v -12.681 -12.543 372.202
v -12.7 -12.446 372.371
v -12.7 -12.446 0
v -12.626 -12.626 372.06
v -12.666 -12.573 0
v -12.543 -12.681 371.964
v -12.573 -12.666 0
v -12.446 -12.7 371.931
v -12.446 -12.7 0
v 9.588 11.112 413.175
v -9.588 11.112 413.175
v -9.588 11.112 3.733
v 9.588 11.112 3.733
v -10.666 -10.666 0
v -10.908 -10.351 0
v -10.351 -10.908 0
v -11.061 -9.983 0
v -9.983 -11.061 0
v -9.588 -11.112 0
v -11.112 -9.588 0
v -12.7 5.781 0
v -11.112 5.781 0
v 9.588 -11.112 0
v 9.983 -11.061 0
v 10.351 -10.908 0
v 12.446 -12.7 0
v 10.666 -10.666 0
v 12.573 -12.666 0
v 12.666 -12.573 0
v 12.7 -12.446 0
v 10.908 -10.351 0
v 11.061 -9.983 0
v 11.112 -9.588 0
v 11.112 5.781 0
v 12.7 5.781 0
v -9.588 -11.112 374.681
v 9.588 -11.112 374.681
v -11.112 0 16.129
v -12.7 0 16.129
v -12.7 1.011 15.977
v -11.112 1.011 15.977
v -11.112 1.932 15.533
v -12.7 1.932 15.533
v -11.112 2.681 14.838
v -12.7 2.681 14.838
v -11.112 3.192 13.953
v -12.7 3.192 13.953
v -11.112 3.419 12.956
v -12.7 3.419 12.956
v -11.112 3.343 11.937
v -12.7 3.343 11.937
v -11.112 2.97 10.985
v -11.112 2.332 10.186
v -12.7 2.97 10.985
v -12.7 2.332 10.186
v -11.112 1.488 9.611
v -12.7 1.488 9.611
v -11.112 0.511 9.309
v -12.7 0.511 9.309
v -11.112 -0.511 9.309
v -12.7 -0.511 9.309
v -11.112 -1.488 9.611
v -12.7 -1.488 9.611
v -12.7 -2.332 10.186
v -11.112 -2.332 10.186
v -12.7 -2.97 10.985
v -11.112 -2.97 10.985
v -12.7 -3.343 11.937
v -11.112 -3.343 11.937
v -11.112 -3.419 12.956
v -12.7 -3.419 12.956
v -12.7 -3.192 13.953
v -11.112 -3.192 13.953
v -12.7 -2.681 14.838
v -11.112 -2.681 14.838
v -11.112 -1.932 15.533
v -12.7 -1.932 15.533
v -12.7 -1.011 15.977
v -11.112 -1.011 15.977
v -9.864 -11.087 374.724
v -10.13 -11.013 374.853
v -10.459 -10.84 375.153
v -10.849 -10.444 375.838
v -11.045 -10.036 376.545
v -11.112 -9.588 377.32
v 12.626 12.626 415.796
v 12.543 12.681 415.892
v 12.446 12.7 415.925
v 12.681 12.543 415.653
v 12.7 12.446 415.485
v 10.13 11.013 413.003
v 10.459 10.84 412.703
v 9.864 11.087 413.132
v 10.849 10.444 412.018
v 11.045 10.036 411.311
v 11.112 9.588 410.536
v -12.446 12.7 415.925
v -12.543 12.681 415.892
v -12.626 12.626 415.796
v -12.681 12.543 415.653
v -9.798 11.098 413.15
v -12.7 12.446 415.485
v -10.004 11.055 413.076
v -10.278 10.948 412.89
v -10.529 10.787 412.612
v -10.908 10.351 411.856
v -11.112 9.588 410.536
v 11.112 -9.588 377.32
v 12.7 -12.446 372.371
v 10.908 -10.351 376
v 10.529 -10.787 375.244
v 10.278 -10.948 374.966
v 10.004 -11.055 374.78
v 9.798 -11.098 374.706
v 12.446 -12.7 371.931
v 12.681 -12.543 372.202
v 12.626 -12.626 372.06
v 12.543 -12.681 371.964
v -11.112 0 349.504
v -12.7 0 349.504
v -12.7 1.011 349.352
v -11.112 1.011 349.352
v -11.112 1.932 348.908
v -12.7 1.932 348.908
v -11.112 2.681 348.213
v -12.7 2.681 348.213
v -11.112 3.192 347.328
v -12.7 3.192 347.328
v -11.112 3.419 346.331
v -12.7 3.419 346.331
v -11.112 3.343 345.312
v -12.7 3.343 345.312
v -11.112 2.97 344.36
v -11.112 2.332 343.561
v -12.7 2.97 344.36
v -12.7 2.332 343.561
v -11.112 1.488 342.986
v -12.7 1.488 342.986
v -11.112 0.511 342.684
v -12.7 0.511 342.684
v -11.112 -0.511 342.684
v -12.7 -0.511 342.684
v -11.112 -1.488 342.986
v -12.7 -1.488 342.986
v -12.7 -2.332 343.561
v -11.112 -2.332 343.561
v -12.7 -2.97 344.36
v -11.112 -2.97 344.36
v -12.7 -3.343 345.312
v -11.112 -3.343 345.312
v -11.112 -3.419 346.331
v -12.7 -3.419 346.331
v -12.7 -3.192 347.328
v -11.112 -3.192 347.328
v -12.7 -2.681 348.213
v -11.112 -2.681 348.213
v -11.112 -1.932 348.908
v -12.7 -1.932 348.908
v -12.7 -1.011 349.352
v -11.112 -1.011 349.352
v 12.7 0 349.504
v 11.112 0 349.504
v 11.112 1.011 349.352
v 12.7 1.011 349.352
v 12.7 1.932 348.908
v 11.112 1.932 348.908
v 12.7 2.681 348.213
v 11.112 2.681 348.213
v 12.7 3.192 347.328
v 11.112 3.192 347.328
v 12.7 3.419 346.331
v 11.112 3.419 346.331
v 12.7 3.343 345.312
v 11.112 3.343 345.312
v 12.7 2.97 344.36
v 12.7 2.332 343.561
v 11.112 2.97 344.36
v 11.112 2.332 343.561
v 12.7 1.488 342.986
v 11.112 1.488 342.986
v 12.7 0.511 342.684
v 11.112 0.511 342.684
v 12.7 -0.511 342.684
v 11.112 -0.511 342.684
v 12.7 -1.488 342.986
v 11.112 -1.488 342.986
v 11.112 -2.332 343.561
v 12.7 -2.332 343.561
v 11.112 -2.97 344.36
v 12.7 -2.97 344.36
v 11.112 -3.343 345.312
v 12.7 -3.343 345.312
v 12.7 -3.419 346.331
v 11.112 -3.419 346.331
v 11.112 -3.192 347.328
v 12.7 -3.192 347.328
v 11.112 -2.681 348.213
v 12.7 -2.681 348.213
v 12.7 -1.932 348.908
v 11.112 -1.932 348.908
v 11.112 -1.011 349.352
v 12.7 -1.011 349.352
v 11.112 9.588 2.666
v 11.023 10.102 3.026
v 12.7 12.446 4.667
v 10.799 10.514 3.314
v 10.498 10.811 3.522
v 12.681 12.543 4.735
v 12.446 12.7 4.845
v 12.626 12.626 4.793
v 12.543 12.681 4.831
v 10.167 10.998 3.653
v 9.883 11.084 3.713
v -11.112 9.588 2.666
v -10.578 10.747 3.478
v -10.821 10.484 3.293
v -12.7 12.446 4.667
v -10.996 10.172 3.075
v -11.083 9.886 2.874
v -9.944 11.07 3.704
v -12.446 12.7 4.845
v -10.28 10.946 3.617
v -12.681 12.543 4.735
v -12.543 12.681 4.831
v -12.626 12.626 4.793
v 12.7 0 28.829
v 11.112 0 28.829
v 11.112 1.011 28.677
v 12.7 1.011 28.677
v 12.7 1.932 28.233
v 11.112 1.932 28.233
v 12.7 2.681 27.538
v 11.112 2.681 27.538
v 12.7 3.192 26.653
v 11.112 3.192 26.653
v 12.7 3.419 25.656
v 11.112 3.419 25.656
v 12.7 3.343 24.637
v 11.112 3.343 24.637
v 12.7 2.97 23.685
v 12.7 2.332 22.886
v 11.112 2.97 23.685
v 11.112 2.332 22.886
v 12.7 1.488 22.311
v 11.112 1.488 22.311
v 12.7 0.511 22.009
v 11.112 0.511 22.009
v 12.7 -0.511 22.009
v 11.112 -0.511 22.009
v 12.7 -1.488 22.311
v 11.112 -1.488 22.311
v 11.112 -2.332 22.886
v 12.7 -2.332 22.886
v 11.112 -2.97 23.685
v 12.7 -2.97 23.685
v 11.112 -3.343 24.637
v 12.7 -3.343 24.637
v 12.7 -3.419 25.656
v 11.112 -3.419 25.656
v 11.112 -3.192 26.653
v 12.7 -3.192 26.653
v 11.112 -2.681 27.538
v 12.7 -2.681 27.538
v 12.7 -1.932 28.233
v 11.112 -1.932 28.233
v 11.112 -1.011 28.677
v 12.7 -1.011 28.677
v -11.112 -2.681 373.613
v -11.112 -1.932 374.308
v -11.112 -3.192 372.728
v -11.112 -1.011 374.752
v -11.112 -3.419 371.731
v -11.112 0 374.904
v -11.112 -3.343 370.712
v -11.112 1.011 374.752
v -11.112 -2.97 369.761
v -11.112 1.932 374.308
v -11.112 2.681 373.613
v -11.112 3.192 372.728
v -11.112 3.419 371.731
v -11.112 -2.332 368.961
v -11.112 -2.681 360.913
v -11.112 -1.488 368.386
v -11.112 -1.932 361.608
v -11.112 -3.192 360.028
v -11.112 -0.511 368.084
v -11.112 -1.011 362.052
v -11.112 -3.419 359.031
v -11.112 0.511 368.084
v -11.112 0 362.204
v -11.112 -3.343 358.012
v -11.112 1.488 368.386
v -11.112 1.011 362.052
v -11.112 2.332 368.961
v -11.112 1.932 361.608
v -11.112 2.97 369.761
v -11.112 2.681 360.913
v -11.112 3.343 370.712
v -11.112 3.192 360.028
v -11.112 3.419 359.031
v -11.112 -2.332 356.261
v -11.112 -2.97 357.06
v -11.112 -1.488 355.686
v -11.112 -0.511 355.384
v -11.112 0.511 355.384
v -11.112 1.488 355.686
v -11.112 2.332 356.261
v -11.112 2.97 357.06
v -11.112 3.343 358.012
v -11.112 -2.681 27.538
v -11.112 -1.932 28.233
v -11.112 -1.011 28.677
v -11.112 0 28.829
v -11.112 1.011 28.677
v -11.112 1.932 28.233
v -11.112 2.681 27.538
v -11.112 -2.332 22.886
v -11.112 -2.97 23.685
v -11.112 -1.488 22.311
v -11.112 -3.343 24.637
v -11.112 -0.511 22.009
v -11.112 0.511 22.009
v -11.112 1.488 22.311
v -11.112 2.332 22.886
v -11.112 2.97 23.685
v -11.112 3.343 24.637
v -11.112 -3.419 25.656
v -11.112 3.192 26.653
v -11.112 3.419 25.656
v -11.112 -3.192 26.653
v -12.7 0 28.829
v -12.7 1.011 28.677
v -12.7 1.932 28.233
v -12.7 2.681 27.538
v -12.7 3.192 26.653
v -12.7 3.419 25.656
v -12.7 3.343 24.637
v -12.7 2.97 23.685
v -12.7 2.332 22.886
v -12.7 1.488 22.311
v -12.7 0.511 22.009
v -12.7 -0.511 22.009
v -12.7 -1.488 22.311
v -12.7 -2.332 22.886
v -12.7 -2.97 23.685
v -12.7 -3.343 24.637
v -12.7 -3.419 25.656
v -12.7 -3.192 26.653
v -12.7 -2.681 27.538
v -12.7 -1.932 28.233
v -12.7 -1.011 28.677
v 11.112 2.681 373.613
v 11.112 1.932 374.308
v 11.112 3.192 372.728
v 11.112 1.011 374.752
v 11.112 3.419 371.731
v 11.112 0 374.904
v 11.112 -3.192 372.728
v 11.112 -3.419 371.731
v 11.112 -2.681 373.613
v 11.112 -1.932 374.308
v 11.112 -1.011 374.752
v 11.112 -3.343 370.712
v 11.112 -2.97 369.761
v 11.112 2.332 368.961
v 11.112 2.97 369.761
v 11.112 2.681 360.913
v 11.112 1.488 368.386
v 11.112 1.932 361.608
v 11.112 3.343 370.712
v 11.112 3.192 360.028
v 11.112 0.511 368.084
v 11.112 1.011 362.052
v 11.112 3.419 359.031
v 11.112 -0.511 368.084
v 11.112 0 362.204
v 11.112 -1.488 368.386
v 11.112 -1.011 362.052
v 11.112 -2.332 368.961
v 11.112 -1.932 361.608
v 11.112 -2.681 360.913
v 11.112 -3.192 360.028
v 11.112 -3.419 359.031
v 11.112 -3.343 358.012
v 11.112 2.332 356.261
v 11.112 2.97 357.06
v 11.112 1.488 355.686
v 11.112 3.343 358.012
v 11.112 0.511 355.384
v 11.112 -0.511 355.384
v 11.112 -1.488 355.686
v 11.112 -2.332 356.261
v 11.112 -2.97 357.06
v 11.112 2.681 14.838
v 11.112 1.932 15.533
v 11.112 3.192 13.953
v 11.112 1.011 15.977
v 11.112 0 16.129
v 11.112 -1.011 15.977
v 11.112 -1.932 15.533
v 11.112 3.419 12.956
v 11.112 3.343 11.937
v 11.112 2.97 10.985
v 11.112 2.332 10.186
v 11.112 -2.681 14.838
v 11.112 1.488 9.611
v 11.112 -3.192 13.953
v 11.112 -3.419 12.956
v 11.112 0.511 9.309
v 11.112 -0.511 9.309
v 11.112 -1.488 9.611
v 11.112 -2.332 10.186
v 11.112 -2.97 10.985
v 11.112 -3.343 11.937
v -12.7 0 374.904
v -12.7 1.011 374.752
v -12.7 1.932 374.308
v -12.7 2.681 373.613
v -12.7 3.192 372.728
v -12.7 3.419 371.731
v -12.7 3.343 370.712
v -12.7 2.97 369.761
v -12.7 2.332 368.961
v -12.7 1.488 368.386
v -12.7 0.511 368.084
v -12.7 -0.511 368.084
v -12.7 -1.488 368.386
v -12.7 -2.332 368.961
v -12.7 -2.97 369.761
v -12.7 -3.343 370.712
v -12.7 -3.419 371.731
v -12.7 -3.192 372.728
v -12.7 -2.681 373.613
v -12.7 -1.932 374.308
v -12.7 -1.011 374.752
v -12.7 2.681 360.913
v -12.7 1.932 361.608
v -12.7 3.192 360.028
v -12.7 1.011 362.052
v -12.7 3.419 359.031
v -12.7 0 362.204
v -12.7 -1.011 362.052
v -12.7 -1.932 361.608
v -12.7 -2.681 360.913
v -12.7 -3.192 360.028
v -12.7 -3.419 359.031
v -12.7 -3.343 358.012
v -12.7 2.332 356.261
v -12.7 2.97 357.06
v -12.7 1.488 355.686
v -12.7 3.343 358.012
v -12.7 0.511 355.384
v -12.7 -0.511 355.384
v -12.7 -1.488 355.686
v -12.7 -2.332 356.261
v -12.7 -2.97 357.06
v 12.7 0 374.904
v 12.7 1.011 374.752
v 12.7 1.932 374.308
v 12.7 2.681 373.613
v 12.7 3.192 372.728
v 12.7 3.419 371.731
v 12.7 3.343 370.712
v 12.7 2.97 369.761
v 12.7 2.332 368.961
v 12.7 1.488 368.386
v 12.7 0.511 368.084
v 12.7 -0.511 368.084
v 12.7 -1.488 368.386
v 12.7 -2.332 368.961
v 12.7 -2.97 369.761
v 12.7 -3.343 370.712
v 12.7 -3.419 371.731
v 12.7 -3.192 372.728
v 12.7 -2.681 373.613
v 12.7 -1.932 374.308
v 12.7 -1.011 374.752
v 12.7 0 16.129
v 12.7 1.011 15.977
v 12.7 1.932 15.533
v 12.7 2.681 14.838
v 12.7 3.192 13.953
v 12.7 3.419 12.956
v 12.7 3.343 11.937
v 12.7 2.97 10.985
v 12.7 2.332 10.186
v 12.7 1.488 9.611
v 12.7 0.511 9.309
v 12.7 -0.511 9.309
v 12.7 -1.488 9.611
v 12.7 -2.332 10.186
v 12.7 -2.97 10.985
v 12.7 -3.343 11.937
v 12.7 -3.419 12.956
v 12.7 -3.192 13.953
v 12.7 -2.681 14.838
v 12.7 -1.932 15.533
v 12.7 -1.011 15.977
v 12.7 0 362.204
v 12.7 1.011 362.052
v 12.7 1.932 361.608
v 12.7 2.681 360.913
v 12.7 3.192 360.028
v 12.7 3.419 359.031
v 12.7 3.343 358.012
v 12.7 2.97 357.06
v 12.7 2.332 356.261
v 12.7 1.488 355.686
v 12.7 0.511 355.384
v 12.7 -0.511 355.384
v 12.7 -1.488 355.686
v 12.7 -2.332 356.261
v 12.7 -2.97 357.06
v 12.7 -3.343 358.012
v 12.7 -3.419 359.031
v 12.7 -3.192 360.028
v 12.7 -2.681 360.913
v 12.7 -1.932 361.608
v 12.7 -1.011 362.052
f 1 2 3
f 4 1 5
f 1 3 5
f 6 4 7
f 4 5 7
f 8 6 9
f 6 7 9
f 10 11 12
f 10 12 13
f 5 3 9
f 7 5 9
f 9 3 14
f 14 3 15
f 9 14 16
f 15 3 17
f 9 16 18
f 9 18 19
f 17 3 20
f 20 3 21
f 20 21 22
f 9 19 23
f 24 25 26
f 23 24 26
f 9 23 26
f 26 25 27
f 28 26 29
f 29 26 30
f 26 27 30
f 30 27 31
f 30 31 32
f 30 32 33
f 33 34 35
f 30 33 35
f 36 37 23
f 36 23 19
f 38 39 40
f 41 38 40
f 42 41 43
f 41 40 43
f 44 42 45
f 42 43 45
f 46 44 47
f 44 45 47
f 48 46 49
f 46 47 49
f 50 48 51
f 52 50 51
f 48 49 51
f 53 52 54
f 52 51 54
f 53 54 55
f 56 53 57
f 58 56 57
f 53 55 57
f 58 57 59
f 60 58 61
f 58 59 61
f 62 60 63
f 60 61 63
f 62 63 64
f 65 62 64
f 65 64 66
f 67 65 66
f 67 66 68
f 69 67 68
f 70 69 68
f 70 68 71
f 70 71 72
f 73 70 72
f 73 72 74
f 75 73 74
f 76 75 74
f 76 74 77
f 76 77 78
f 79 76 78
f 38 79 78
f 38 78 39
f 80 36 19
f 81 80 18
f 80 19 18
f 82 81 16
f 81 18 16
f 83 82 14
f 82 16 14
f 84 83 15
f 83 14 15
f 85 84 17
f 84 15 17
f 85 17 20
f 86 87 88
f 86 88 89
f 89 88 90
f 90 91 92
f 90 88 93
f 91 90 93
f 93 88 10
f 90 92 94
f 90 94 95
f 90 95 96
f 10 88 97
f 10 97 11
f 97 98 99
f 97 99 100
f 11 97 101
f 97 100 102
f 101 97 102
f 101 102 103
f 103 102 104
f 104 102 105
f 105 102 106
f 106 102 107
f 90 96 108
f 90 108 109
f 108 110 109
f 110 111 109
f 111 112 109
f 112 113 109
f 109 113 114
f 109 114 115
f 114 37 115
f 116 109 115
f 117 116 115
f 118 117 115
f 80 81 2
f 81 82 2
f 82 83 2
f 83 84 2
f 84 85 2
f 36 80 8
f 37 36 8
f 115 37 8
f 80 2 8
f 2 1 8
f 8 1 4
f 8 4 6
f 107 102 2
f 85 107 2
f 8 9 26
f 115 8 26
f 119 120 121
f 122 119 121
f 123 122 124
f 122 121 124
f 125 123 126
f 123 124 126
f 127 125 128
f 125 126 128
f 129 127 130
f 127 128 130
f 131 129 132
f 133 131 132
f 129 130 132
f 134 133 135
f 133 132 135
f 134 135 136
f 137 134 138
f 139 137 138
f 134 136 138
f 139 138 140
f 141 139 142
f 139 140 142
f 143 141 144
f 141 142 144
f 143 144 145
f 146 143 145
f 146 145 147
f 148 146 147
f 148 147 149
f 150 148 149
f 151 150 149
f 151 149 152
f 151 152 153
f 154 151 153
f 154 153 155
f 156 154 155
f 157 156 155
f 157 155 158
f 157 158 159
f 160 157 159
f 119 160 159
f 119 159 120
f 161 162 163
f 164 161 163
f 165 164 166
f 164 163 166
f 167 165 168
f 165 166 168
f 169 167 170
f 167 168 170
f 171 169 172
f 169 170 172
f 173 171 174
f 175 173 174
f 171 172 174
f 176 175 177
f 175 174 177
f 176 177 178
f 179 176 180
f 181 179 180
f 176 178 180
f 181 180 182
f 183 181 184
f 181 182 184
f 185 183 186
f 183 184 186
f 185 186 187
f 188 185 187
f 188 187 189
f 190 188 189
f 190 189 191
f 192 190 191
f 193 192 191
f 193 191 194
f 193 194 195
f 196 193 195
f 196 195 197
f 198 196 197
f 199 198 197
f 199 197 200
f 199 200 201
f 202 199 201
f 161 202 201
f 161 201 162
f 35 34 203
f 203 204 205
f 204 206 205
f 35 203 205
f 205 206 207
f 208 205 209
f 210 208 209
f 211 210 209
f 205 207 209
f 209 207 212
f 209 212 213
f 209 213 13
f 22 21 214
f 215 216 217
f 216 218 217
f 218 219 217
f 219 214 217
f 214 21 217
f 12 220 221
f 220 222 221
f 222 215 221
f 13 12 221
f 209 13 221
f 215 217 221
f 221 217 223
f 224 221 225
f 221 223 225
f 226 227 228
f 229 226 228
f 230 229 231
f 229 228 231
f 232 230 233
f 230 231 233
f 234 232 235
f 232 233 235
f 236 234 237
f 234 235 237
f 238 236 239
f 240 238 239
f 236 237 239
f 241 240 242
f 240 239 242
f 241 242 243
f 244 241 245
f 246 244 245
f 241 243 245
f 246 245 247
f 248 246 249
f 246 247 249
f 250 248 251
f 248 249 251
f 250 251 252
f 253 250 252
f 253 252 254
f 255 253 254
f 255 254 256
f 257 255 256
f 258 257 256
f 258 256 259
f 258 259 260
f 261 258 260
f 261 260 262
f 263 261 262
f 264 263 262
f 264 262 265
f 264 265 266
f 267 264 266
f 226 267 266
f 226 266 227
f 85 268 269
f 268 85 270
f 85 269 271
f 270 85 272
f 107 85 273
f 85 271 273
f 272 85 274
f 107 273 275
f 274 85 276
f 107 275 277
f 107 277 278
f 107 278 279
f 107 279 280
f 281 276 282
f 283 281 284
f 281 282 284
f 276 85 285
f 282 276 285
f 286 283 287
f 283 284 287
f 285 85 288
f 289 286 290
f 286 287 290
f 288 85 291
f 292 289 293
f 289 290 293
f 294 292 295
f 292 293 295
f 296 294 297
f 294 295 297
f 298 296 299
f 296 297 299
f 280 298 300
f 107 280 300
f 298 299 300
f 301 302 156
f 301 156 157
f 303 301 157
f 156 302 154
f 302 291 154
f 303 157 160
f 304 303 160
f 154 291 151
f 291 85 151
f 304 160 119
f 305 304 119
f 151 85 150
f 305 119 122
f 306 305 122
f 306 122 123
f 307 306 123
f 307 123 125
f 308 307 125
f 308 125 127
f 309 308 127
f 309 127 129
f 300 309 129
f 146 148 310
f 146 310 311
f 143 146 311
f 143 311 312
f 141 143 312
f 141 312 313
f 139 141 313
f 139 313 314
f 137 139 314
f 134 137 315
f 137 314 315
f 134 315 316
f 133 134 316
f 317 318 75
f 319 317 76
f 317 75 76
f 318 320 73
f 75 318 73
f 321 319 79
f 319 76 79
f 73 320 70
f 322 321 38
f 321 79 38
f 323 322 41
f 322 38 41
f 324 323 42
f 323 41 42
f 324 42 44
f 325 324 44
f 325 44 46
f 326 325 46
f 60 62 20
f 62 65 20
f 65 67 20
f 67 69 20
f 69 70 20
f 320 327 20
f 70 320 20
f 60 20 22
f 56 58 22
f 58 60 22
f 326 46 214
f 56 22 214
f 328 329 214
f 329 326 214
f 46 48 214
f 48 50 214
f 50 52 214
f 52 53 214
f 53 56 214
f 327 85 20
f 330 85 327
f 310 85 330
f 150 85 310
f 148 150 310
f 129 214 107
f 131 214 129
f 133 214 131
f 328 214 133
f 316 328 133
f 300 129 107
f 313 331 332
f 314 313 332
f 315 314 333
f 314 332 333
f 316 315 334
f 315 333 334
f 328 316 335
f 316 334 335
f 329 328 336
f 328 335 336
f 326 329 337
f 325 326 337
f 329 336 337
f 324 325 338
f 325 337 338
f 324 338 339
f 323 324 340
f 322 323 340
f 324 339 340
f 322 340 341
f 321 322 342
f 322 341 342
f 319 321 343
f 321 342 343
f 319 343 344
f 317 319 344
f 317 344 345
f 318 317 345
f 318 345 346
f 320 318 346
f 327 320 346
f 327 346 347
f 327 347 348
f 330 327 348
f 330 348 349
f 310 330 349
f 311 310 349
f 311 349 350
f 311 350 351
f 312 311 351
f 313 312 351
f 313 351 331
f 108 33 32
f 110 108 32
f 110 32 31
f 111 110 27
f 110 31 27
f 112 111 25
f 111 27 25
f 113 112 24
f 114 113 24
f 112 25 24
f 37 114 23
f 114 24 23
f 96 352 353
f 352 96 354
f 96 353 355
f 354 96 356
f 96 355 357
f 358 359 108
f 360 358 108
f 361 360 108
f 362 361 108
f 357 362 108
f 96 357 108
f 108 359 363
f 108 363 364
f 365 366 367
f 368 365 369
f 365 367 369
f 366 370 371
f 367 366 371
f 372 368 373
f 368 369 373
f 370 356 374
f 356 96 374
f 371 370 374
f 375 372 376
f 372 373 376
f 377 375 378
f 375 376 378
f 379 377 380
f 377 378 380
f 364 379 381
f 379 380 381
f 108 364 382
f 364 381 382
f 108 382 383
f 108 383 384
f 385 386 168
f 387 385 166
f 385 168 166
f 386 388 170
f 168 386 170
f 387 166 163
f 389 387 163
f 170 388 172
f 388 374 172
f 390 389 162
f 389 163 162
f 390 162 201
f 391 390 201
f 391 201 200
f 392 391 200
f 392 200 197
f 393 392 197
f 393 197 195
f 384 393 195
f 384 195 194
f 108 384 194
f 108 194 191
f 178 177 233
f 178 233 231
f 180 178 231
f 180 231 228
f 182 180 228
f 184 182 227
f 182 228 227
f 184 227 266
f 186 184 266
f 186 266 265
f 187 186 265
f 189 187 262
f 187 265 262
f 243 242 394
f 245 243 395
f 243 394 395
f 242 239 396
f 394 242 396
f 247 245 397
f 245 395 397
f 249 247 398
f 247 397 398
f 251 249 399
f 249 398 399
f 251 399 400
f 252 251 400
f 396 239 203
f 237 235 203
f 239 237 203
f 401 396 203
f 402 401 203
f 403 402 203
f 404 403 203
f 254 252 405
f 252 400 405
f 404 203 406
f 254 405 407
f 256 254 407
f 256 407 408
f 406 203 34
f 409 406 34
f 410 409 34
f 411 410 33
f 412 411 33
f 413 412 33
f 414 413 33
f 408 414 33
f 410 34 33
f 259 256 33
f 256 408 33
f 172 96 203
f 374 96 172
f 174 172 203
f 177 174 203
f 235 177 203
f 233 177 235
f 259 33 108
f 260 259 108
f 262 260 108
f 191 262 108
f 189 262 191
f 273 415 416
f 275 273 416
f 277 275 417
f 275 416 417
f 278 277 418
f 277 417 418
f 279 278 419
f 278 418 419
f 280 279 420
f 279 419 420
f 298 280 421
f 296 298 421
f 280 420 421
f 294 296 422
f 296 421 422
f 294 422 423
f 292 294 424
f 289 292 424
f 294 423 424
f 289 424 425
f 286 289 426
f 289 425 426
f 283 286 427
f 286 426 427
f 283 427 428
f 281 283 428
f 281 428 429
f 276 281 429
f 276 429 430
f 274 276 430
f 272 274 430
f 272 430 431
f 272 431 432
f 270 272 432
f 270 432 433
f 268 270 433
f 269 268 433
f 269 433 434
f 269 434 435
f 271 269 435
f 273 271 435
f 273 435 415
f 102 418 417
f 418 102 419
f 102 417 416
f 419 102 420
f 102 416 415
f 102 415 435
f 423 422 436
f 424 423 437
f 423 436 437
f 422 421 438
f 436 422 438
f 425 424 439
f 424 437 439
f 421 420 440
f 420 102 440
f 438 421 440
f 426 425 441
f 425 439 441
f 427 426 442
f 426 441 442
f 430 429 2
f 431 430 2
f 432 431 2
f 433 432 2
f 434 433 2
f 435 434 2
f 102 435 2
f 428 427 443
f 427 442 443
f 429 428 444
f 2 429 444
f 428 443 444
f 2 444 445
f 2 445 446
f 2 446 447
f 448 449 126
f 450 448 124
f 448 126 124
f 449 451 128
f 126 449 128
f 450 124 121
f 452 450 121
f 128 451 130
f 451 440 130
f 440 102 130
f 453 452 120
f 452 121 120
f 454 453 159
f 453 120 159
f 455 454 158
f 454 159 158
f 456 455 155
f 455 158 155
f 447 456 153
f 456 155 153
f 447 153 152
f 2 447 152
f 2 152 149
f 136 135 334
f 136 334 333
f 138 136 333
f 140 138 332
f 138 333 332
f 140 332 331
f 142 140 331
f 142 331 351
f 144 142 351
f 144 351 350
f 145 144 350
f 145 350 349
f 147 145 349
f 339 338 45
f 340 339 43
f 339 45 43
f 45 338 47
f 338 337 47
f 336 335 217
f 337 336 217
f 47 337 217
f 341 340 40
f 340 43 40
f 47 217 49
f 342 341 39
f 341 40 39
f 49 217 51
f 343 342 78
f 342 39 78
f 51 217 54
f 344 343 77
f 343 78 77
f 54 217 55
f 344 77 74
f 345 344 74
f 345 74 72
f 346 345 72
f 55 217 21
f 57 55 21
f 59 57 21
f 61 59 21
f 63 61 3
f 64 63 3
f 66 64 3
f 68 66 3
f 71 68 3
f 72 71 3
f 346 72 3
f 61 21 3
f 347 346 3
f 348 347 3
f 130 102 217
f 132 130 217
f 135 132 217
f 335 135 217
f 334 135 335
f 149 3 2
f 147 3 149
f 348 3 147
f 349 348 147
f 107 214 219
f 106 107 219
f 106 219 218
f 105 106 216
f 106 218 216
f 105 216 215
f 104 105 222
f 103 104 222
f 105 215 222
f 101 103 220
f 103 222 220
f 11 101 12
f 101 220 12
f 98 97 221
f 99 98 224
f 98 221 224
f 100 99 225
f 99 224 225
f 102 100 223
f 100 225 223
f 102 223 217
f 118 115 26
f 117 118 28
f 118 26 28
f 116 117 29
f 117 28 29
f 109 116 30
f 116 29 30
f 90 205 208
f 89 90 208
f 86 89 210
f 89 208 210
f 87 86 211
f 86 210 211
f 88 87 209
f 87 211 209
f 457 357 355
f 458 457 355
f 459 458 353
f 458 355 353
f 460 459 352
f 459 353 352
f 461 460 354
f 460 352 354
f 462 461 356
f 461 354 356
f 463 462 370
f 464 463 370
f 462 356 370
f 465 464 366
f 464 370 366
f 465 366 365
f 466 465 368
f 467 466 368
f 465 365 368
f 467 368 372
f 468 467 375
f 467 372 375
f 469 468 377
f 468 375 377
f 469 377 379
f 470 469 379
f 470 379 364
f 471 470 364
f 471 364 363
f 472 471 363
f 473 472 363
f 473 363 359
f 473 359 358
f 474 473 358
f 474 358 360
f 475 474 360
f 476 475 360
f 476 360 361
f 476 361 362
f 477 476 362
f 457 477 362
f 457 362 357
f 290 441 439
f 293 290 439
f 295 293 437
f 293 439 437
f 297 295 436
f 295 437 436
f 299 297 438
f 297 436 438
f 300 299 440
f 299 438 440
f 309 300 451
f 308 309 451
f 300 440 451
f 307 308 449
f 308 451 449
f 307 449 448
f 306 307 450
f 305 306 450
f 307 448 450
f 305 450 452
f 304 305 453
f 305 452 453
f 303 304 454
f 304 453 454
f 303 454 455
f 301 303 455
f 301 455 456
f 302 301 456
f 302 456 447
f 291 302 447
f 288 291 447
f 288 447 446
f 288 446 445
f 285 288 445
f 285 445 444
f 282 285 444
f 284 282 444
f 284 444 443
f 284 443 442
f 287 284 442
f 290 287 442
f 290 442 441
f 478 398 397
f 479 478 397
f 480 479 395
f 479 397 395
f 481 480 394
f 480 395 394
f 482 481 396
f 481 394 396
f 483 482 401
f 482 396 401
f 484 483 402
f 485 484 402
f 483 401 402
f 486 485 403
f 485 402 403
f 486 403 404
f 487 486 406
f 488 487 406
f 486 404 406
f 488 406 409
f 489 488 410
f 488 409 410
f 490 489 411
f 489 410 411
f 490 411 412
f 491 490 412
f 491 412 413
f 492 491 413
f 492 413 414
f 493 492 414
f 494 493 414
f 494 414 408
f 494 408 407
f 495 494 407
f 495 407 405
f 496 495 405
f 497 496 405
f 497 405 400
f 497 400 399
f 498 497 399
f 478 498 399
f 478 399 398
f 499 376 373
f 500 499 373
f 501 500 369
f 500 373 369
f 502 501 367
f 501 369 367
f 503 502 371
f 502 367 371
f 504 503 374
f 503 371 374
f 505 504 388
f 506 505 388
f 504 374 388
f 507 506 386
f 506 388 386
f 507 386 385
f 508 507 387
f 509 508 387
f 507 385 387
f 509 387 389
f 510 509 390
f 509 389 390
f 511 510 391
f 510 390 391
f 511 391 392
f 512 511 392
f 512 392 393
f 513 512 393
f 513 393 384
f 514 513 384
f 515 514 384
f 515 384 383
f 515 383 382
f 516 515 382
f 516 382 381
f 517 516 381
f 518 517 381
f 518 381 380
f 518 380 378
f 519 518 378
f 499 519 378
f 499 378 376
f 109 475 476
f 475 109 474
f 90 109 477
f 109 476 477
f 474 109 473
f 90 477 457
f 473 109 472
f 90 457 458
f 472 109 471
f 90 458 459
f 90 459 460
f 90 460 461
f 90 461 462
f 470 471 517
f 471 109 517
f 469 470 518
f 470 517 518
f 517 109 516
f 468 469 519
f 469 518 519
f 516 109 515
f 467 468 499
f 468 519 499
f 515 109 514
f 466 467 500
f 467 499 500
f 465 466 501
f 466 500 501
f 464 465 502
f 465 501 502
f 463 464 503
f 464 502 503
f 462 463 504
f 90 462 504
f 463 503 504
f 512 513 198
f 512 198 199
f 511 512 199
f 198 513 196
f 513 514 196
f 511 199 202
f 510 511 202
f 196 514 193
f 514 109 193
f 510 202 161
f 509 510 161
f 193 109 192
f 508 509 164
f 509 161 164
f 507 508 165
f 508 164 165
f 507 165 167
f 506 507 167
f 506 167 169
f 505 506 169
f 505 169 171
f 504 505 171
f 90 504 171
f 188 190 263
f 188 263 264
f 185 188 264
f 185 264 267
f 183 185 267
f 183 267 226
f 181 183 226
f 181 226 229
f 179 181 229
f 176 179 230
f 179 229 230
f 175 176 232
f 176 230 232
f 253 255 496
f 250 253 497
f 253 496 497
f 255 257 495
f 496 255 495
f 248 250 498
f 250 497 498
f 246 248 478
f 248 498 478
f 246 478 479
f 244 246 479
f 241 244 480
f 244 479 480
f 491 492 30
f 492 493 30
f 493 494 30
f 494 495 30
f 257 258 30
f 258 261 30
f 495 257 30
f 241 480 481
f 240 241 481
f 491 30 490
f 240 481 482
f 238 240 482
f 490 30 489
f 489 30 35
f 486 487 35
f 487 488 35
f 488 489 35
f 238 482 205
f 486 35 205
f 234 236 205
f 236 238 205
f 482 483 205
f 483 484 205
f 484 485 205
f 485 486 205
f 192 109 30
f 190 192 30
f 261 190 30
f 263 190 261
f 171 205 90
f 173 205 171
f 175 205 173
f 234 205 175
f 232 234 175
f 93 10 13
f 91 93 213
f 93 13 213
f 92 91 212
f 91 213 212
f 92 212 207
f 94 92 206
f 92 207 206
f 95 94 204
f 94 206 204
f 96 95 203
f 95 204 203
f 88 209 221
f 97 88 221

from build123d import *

# Parameters (mm, degrees)
BOSS_EXTRUDE1_DEPTH = 415.925
SKETCH2_R           = 3.429
CUT_EXTRUDE1_DEPTH  = 26.4


with BuildPart() as part:
    # Sketch1 → Boss-Extrude1 (new body)
    with BuildSketch(Plane.XY):
        with BuildLine():
            Line((-12.446, -12.7), (12.446, -12.7))
            ThreePointArc((12.446, -12.7), (12.625605122, -12.625605122), (12.7, -12.446))
            Line((12.7, -12.446), (12.7, 12.446))
            ThreePointArc((12.7, 12.446), (12.625605122, 12.625605122), (12.446, 12.7))
            Line((12.446, 12.7), (-12.446, 12.7))
            ThreePointArc((-12.446, 12.7), (-12.625605122, 12.625605122), (-12.7, 12.446))
            Line((-12.7, 12.446), (-12.7, -12.446))
            ThreePointArc((-12.7, -12.446), (-12.625605122, -12.625605122), (-12.446, -12.7))
        make_face()
        with BuildLine():
            Line((-11.1125, -9.5885), (-11.1125, 9.5885))
            ThreePointArc((-11.1125, 9.5885), (-10.666130735, 10.666130735), (-9.5885, 11.1125))
            Line((-9.5885, 11.1125), (9.5885, 11.1125))
            ThreePointArc((9.5885, 11.1125), (10.666130735, 10.666130735), (11.1125, 9.5885))
            Line((11.1125, 9.5885), (11.1125, -9.5885))
            ThreePointArc((11.1125, -9.5885), (10.666130735, -10.666130735), (9.5885, -11.1125))
            Line((9.5885, -11.1125), (-9.5885, -11.1125))
            ThreePointArc((-9.5885, -11.1125), (-10.666130735, -10.666130735), (-11.1125, -9.5885))
        make_face(mode=Mode.SUBTRACT)
    extrude(amount=BOSS_EXTRUDE1_DEPTH)

    # Sketch2 → Cut-Extrude1 (cut, through all)
    with BuildSketch(Plane.ZY.offset(12.7)):
        with Locations((371.475, 0)):
            Circle(SKETCH2_R)
        with Locations((358.775, 0)):
            Circle(SKETCH2_R)
        with Locations((346.075, 0)):
            Circle(SKETCH2_R)
        with Locations((12.7, 0)):
            Circle(SKETCH2_R)
        with Locations((25.4, 0)):
            Circle(SKETCH2_R)
        Polygon((415.925, 12.7), (371.930909488, -12.7), (415.925, -12.7), align=None)
        Polygon((0, 5.78069553), (4.844949149, 12.7), (0, 12.7), align=None)
    extrude(amount=-CUT_EXTRUDE1_DEPTH, mode=Mode.SUBTRACT)


solid = part.part
